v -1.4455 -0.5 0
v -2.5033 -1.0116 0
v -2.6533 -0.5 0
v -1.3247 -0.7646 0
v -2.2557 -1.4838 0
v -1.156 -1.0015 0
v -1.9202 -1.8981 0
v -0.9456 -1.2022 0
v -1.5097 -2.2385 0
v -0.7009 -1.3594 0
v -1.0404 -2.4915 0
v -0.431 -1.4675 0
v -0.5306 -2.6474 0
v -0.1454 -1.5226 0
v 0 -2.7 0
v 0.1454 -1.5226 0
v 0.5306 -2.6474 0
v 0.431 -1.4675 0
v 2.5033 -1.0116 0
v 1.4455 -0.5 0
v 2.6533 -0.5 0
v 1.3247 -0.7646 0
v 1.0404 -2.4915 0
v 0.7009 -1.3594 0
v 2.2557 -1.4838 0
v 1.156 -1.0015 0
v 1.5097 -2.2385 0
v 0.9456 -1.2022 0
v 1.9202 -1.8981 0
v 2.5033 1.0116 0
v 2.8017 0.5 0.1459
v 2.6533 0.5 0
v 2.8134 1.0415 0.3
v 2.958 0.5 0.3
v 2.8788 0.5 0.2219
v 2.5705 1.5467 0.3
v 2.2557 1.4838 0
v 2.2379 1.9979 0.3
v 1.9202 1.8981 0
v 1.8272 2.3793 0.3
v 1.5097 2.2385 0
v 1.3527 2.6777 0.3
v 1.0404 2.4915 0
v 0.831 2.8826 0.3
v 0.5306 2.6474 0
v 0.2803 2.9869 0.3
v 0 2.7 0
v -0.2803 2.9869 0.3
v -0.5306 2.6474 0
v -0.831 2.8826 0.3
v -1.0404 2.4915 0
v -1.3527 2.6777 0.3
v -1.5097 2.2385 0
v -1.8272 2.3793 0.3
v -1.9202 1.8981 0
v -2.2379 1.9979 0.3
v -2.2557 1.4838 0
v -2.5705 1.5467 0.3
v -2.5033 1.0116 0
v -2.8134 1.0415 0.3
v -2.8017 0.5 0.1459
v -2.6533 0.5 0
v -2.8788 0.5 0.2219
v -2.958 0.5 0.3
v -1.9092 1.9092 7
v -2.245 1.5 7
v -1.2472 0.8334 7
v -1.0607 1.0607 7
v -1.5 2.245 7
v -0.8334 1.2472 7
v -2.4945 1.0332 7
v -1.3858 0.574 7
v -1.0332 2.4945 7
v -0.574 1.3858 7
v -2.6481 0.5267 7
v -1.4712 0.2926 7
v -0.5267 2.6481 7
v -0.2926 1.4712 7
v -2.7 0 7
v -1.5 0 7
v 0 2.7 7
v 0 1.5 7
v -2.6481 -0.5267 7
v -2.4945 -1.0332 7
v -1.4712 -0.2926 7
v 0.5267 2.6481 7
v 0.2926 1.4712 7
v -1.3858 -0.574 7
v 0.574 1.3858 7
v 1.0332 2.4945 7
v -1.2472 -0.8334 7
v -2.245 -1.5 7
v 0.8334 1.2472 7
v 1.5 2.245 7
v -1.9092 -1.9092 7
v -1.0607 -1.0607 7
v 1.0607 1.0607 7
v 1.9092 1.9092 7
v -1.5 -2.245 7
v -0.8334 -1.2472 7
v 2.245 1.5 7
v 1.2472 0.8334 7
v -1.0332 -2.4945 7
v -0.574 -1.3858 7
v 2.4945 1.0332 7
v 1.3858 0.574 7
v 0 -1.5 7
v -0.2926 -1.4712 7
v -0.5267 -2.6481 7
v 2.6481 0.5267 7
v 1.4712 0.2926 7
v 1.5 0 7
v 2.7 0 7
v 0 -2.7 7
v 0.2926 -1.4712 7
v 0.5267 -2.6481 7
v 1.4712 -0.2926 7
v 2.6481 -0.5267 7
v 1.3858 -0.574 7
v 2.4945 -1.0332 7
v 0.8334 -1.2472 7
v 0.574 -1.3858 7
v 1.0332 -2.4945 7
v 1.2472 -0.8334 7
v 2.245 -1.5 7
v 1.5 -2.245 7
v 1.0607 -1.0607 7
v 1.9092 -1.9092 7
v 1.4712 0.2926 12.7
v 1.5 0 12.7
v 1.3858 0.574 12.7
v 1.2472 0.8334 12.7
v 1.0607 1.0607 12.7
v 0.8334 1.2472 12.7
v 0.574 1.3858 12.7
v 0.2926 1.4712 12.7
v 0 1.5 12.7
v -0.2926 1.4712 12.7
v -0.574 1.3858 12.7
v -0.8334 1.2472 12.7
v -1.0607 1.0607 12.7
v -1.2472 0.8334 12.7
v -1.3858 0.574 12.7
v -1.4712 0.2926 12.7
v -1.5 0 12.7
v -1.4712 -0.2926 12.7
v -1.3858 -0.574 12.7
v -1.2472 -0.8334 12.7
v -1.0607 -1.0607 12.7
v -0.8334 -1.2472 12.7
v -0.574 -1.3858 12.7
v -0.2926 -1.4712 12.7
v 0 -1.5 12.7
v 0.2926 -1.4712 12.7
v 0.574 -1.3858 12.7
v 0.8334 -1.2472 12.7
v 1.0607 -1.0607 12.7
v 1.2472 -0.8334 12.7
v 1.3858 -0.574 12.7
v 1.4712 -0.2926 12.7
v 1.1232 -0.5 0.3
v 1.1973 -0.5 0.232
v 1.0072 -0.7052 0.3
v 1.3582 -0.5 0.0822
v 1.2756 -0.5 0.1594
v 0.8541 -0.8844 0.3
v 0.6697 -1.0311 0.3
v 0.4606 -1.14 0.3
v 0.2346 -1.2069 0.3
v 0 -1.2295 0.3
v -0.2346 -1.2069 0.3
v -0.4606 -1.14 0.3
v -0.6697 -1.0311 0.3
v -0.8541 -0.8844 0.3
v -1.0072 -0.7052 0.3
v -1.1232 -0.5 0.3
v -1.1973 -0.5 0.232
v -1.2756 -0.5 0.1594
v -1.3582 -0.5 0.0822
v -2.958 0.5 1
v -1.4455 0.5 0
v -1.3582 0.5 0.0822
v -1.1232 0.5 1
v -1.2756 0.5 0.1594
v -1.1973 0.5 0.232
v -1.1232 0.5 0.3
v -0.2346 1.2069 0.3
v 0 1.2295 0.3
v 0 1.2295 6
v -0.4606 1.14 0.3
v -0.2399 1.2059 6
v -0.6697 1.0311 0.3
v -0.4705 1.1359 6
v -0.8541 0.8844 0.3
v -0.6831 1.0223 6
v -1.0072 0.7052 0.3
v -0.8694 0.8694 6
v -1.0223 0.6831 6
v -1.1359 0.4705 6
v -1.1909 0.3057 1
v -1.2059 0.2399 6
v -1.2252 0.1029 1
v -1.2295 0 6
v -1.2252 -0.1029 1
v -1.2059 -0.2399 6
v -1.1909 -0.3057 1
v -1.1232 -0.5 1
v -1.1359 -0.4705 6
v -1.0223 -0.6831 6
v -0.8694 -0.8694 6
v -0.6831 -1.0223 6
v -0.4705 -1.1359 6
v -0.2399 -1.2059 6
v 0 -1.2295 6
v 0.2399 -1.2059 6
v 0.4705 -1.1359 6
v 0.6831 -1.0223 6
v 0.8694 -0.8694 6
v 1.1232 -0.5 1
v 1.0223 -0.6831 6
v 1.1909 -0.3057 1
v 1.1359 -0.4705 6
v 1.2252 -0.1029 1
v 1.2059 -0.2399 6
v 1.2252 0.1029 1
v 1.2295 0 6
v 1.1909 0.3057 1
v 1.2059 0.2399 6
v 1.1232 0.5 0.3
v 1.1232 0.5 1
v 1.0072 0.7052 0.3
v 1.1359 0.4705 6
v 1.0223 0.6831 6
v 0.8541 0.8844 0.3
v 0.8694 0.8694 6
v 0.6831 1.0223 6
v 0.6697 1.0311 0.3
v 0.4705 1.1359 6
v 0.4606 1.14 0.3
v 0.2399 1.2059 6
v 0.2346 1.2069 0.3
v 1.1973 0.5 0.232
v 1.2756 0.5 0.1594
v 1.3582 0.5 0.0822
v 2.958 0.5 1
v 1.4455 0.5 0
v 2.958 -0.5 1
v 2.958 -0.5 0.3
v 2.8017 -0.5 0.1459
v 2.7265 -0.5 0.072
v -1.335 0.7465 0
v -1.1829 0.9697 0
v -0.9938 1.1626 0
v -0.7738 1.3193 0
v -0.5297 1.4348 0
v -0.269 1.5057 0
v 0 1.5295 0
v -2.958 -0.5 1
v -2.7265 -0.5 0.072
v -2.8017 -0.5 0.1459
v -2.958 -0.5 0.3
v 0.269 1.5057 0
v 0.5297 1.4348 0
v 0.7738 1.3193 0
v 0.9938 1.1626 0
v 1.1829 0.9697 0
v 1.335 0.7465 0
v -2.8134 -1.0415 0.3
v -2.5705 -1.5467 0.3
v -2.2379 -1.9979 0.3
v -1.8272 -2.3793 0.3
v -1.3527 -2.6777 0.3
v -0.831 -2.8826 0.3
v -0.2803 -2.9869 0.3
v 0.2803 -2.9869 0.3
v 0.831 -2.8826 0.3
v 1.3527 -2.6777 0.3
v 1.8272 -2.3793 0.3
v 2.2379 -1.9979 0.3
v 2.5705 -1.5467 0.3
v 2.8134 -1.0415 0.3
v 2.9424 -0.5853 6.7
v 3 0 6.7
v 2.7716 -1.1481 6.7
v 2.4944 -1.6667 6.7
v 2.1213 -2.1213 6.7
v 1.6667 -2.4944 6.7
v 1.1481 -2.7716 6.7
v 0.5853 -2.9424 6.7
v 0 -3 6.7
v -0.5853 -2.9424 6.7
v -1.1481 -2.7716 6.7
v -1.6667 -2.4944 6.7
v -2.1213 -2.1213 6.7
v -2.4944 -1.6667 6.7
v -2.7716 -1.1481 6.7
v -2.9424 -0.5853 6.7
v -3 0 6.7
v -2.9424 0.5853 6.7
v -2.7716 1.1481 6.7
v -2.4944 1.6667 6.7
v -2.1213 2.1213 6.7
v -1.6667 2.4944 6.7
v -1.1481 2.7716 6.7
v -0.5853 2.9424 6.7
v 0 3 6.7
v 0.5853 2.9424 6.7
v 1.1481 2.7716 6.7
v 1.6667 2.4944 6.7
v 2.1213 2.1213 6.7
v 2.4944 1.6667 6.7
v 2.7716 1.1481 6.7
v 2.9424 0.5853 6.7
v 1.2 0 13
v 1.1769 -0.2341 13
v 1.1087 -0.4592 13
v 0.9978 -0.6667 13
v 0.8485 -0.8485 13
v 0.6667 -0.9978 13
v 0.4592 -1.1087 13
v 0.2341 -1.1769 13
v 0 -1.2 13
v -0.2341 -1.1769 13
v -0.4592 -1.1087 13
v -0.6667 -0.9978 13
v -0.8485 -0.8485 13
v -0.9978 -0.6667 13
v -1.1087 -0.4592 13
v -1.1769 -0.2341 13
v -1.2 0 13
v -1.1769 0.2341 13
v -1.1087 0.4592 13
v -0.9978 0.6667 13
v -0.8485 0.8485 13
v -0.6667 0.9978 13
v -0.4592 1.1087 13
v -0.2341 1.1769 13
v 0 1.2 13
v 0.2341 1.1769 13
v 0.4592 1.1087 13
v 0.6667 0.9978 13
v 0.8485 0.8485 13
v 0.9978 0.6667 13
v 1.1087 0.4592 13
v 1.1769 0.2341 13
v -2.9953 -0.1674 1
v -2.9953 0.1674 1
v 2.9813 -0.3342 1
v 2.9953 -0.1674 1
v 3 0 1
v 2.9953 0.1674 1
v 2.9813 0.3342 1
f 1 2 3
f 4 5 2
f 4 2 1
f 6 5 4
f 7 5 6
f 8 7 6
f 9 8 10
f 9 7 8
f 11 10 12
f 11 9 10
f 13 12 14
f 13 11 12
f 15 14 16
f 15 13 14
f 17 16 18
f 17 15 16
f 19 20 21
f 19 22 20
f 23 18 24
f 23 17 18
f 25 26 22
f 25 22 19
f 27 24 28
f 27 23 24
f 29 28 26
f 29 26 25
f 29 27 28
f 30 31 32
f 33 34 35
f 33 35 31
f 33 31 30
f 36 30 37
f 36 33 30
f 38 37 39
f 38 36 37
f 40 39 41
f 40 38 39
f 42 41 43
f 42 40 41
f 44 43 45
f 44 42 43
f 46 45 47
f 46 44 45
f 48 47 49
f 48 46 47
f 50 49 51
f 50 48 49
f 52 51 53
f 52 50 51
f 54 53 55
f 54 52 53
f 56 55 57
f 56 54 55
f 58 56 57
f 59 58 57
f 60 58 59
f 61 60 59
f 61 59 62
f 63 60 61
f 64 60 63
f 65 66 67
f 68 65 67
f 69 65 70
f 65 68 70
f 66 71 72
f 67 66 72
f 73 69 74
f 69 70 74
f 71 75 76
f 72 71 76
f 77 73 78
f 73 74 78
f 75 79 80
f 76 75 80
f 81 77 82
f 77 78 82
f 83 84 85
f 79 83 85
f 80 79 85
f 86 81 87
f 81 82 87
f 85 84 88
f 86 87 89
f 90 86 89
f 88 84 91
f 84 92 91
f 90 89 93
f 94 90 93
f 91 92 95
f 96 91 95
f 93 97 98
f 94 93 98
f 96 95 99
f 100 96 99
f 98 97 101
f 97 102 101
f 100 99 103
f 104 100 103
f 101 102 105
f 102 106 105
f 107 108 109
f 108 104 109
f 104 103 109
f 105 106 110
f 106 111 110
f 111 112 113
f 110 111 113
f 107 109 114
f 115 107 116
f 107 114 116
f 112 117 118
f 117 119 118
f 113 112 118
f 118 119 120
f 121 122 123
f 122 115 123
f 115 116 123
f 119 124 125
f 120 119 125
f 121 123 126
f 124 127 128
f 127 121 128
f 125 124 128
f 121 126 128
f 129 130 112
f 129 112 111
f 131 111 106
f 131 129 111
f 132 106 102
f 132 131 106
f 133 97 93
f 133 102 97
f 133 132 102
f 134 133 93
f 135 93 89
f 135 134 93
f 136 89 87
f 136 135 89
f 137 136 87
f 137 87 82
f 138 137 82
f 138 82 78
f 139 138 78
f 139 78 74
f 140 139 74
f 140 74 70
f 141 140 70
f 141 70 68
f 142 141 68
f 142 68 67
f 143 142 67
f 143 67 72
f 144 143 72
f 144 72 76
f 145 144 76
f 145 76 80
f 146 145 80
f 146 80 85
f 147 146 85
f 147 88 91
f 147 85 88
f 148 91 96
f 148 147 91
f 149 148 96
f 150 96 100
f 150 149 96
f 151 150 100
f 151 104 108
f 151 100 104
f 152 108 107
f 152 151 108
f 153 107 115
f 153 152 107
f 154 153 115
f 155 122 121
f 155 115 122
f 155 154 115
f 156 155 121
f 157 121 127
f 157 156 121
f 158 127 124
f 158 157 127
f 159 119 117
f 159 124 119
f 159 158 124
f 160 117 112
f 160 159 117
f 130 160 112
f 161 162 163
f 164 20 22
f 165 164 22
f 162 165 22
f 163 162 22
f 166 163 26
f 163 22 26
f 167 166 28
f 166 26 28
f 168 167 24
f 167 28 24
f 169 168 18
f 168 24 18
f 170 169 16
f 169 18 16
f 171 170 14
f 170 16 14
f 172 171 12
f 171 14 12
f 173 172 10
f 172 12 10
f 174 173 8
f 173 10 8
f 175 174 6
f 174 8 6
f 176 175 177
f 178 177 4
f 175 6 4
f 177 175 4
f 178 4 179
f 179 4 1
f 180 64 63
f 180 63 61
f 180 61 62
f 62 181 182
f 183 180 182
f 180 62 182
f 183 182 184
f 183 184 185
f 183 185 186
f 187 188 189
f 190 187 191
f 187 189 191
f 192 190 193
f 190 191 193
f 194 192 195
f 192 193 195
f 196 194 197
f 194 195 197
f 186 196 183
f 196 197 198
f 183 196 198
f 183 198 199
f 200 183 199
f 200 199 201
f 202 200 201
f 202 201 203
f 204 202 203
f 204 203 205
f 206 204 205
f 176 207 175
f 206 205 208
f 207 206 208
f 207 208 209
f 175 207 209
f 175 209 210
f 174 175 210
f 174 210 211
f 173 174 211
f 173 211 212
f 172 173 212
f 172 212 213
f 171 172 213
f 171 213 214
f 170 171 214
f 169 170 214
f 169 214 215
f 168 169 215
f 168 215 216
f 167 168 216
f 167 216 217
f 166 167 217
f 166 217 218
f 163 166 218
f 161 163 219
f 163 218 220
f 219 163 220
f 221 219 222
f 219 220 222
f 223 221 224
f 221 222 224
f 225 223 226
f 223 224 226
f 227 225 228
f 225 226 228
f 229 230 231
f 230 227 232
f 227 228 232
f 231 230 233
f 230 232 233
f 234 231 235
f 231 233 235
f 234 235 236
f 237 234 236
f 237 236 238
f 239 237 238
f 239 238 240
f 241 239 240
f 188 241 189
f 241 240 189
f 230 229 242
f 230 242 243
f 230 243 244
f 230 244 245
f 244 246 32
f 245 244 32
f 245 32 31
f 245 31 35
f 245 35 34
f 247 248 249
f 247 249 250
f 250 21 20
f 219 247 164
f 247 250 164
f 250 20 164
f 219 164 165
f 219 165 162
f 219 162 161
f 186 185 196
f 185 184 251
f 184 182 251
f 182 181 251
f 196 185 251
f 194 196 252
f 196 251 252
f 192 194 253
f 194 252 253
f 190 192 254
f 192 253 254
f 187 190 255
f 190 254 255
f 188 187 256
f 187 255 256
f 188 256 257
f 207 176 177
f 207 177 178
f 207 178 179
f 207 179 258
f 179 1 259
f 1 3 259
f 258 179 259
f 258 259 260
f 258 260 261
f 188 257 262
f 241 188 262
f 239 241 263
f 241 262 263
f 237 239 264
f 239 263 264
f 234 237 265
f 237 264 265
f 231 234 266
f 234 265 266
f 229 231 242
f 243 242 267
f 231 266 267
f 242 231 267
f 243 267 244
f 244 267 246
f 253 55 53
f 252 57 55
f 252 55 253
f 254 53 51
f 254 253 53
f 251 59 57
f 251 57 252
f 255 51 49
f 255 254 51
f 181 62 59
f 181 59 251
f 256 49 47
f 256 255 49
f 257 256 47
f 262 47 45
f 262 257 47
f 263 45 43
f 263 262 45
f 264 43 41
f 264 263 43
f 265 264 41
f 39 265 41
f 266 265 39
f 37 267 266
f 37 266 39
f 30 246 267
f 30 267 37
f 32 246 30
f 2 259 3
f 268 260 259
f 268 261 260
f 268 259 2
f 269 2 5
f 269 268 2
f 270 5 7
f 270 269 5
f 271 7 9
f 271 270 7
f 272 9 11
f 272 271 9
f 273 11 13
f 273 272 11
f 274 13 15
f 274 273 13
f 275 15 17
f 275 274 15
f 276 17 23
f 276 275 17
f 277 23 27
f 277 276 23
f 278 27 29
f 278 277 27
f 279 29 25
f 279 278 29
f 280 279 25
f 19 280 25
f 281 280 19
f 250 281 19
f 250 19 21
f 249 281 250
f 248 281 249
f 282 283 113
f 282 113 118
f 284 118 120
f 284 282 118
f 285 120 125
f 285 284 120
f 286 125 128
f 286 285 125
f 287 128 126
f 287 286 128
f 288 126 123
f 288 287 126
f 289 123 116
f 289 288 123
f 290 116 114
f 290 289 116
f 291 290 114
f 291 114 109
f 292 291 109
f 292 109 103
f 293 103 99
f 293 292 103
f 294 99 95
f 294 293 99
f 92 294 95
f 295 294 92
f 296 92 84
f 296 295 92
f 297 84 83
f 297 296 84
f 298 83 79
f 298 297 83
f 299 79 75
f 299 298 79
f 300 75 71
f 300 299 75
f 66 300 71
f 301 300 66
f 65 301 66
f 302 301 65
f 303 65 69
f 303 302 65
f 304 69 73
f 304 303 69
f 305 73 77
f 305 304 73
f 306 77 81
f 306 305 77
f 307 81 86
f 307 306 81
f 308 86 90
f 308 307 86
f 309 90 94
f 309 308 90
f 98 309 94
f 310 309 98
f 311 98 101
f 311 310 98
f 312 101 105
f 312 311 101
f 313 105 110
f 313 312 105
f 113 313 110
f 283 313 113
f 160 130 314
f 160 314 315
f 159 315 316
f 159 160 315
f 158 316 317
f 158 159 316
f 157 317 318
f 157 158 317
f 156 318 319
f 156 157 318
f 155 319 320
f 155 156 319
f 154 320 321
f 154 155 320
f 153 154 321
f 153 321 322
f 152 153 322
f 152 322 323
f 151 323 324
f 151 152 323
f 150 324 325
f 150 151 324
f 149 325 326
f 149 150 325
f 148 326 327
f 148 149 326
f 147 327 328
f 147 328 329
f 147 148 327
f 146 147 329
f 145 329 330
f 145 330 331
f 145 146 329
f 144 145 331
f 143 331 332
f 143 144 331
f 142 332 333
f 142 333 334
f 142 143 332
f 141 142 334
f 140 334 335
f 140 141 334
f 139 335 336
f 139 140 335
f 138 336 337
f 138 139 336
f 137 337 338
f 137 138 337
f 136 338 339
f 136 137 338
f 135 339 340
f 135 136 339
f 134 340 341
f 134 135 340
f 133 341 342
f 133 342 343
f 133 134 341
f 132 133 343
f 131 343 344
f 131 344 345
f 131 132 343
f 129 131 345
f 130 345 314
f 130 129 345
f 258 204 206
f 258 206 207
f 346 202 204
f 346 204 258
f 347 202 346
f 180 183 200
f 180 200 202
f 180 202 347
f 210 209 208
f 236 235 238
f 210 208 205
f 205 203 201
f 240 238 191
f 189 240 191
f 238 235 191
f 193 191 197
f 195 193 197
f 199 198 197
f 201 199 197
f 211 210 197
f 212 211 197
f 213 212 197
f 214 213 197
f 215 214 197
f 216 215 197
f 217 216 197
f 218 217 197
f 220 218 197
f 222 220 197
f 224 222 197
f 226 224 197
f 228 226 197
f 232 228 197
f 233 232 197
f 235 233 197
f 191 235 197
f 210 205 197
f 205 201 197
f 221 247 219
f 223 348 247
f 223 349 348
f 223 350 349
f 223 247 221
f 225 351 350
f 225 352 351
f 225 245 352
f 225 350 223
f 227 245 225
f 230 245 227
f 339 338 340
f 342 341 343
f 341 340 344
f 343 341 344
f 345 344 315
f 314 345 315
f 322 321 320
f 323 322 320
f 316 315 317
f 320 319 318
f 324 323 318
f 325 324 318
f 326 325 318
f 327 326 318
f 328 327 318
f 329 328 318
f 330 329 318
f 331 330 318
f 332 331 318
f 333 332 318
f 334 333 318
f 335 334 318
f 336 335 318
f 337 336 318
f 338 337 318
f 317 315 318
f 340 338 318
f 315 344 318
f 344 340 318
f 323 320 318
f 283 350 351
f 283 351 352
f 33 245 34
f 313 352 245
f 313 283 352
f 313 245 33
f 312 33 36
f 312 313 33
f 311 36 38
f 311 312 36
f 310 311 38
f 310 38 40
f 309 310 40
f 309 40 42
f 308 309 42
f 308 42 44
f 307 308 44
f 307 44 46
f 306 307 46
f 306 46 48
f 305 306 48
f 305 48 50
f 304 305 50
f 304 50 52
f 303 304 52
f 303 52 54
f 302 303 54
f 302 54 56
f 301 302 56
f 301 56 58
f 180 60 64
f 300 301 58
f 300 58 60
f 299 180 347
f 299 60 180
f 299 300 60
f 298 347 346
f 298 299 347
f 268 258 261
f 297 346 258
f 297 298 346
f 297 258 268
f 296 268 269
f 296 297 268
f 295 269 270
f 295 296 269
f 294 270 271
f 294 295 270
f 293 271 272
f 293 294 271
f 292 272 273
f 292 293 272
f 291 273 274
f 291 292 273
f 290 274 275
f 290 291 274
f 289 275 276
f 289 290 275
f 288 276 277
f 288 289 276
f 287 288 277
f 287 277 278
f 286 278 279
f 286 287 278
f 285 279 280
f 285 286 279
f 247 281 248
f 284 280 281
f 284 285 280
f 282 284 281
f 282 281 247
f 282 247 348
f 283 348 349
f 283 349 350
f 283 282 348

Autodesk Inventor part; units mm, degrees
ref_plane "YZ Plane" through (0, 0, 0) normal (1, 0, 0) x (0, 1, 0)
ref_plane "XZ Plane" through (0, 0, 0) normal (0, 1, 0) x (-1, 0, 0)
ref_plane "XY Plane" through (0, 0, 0) normal (0, 0, 1) x (1, 0, 0)
sketch "Sketch1" plane through (0, 0, 0) normal (0, 1, 0) x (-1, 0, 0)
  line L0 (0, 0) -> (-3, 0)
  line L1 (-3, 0) -> (-3, 7)
  line L2 (-3, 7) -> (-1.5, 7)
  line L3 (-1.5, 7) -> (-1.5, 13)
  line L4 (-1.5, 13) -> (0, 13)
  line L5 (0, 13) -> (0, 0)
  dimension "d1" = 6
  dimension "d2" = 7
  dimension "d3" = 3
  dimension "d4" = 6
revolve "Revolution1" add sketch "Sketch1" angle 360 about axis through (0, 0, 13) along (0, 0, -1)
sketch "Sketch2" plane through (0, 0, 0) normal (0, 0, -1) x (-1, 0, 0)
  line L0 (-3, -0.5) -> (3, -0.5)
  line L1 (3, -0.5) -> (3, 0.5)
  line L2 (3, 0.5) -> (-3, 0.5)
  line L3 (-3, 0.5) -> (-3, -0.5)
  line L4 (-3, -0.5) -> (3, 0.5) construction
  line L5 (3, -0.5) -> (-3, 0.5) construction
  circle A0 centre (0, 0) radius 3 projected
  dimension "d6" = 1
extrude "Extrusion1" cut sketch "Sketch2" against normal blind 1 contours L3 A0 L0 | A0 L2 L0 | L3 L2 A0 | A0 L1 L0 | A0 L2 L1
hole "Hole1" at (0, 0, 0) direction (0, 0, 1) diameter 2.459 depth 6 thread size "M3x0.5" class "6H" standard "ANSI Metric M Profile"
thread "Thread1" size "M3x0.5" class "6g" standard "ANSI Metric M Profile" full length
chamfer "Chamfer1" distance 0.3 angle 45 7 edges at (-3, 0, 7) (0, 3, 0) (0, -3, 0) (0, -1.2295, 0) (-0.6697, 1.0311, 0) (0.6697, 1.0311, 0) (-1.5, 0, 13)
properties part number "BRU-307S" material "Stainless Steel AISI 304"
